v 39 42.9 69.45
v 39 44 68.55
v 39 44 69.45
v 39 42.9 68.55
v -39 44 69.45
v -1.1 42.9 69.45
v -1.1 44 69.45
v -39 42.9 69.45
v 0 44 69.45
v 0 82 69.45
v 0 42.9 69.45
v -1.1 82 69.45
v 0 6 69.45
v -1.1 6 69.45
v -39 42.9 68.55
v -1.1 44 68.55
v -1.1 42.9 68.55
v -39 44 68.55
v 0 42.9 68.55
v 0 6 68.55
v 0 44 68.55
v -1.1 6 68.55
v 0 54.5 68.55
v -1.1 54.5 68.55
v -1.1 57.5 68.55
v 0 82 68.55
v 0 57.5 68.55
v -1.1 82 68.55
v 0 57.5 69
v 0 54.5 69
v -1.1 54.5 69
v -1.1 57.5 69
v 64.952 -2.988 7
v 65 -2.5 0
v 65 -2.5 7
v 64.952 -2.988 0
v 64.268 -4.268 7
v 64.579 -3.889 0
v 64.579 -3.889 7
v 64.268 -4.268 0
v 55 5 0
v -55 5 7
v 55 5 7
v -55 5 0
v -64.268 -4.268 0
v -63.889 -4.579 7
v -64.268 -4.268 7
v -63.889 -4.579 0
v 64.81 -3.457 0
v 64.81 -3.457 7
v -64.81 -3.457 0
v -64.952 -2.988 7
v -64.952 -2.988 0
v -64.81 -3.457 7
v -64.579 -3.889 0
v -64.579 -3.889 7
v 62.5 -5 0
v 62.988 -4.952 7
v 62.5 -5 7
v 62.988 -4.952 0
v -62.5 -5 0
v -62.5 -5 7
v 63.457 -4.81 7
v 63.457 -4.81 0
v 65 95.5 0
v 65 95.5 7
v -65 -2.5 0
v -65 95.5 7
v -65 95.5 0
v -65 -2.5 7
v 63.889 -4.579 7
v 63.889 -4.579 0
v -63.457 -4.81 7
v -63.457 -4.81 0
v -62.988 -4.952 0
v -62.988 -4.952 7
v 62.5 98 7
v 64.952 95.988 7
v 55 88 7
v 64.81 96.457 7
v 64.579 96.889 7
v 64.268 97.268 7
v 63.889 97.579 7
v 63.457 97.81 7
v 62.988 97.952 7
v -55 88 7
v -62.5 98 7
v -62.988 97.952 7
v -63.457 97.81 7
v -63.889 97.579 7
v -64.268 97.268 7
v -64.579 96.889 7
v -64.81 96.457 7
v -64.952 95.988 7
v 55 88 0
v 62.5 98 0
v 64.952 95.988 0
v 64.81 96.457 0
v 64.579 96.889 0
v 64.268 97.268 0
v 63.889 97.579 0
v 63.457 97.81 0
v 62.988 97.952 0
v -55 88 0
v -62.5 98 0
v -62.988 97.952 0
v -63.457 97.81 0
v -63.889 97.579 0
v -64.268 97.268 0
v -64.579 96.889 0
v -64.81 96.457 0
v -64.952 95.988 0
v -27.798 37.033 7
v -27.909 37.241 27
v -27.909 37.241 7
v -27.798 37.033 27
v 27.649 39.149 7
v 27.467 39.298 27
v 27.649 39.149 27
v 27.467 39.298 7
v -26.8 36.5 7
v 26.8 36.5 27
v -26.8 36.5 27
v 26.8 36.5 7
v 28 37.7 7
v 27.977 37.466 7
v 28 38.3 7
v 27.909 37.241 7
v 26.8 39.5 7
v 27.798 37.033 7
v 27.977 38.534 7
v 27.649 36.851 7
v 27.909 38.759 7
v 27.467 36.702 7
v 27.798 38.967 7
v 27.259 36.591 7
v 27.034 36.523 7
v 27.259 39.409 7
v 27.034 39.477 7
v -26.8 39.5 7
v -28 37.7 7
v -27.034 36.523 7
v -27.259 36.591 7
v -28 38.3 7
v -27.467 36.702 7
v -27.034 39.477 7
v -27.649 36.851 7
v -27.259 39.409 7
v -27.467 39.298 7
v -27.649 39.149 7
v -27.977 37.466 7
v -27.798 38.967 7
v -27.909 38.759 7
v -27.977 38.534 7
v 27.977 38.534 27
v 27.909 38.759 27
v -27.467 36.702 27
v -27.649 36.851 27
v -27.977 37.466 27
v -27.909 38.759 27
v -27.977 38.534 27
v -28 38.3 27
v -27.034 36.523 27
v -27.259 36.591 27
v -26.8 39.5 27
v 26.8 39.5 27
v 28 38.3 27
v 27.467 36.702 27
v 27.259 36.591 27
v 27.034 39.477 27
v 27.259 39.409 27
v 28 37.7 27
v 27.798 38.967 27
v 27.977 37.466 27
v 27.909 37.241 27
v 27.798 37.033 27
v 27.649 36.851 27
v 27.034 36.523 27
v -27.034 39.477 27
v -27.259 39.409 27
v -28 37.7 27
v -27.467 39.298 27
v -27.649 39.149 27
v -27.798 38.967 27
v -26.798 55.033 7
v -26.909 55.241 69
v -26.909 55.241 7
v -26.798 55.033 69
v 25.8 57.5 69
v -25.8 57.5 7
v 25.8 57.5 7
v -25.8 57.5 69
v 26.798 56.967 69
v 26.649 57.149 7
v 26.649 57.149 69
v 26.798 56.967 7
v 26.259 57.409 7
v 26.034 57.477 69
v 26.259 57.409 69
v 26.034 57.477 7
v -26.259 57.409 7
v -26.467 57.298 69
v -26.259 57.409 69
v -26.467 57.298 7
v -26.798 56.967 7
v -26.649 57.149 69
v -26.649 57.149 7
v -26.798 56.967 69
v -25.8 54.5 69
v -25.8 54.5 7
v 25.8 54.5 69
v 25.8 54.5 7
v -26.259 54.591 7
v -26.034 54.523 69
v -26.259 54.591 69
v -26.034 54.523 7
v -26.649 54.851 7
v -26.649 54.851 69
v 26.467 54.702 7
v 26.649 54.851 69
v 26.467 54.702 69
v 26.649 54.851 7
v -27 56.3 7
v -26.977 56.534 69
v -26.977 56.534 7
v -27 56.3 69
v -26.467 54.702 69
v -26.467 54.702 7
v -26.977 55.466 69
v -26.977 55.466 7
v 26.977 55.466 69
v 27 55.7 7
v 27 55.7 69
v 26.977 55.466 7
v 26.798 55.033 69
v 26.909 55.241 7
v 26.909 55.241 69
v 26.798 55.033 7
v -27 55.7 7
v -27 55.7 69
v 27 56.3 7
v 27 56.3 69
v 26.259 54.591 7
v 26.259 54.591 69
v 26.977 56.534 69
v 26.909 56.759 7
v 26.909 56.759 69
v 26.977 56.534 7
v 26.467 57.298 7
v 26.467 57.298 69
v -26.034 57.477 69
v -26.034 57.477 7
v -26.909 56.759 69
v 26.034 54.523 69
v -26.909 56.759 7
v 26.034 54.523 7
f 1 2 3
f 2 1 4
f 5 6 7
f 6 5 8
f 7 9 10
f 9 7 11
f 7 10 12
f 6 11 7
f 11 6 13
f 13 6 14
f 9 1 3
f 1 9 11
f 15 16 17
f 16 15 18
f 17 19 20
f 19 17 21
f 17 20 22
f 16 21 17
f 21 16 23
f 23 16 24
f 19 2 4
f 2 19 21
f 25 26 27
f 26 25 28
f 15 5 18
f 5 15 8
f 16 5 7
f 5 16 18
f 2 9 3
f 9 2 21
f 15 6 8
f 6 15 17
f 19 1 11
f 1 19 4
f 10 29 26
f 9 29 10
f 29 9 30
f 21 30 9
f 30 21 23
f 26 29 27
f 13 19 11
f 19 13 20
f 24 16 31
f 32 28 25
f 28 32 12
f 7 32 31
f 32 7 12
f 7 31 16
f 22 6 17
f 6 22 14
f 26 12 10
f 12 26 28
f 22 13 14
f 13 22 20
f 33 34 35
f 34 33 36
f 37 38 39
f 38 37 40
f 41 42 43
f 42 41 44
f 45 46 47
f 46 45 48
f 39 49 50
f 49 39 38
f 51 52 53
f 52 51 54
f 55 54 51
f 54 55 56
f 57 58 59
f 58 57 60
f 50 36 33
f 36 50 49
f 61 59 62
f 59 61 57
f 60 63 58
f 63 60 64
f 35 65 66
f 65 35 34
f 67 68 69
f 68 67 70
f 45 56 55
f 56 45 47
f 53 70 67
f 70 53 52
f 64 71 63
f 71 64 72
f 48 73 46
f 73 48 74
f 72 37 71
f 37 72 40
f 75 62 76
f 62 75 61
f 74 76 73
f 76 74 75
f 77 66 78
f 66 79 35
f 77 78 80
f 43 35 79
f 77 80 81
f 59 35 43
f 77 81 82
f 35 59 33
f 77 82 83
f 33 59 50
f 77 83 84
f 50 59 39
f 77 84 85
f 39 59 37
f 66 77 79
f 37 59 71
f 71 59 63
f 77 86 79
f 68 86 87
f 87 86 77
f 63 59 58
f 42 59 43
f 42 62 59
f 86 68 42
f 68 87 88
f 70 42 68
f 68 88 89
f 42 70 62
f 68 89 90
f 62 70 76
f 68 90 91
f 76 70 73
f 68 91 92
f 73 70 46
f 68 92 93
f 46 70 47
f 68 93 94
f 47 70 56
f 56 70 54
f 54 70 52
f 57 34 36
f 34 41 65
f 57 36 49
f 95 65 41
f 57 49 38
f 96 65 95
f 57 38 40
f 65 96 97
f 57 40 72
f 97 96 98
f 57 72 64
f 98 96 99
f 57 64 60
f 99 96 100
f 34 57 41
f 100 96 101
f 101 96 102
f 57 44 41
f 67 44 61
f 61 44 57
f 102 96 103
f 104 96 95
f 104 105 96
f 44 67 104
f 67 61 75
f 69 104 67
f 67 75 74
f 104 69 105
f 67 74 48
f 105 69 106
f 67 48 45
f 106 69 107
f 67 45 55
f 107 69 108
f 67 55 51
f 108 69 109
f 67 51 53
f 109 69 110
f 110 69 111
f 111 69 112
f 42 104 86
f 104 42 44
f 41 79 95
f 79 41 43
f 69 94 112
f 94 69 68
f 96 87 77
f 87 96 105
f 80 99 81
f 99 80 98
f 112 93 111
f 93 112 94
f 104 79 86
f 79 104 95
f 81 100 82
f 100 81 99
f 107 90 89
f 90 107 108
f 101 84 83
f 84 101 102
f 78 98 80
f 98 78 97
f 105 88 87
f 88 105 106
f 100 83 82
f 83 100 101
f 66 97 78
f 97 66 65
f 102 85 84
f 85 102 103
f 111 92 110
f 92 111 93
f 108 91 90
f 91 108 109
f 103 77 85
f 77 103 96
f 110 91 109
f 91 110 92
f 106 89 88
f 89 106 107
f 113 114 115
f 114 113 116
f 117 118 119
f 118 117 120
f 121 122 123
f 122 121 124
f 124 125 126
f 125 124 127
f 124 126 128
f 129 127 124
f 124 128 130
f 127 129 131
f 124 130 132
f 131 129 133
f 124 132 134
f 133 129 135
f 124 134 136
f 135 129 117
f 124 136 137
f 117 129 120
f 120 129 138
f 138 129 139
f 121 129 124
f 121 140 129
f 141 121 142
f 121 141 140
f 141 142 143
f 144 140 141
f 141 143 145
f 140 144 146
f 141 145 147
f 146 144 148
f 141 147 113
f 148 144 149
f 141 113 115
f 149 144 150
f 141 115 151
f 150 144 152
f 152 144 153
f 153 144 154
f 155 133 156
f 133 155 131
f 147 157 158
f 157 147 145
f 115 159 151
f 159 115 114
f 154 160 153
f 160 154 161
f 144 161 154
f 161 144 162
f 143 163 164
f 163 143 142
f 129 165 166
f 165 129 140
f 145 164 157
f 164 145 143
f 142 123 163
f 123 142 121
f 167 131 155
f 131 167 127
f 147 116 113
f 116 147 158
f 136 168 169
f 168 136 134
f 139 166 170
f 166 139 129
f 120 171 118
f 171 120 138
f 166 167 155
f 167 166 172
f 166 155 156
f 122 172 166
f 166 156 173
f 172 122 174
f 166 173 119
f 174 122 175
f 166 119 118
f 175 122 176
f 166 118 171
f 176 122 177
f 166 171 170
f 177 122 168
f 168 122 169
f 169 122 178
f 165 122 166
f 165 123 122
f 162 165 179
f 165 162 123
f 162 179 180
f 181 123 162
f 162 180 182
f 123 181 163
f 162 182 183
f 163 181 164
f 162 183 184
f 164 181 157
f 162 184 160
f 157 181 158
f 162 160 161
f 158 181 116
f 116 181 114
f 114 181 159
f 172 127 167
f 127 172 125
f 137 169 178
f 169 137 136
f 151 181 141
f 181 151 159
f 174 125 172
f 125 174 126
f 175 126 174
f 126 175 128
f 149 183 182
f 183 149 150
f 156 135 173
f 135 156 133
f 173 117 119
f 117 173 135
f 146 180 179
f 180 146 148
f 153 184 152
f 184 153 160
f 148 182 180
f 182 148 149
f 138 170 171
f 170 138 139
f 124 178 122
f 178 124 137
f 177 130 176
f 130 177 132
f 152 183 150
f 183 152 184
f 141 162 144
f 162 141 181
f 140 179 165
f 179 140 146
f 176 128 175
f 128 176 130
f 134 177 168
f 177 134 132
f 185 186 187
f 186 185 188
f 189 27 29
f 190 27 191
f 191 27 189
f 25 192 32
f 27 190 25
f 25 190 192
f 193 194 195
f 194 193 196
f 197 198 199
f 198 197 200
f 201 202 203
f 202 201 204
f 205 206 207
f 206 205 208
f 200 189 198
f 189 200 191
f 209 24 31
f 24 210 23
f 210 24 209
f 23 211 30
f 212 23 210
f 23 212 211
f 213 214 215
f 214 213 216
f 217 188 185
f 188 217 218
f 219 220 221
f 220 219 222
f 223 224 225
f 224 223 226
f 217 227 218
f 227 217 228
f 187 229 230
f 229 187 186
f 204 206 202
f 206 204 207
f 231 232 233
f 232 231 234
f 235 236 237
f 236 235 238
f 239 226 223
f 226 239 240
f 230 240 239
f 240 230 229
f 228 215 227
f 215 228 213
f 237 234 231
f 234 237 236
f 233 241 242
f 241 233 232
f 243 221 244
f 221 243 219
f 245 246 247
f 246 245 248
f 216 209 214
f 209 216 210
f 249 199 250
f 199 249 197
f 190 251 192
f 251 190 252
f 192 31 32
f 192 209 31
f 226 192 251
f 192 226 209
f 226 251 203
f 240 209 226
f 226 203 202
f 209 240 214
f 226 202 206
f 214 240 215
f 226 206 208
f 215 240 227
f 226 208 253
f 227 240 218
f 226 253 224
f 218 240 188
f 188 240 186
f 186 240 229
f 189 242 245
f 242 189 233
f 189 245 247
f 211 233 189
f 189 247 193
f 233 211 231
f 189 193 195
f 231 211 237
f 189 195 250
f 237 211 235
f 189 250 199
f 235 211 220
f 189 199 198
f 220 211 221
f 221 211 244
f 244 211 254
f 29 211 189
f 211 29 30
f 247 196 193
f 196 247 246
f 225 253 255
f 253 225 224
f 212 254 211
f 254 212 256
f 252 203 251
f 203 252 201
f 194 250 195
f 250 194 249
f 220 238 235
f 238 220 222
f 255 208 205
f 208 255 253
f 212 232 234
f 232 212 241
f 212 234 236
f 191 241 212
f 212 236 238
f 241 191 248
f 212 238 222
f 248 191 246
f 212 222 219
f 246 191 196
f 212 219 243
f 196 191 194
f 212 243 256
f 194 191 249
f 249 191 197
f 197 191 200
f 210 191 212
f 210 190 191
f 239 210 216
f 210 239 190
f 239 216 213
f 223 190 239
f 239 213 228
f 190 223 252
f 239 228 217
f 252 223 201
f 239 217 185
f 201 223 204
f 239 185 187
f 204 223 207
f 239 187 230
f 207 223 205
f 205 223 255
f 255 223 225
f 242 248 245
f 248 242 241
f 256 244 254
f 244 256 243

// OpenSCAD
// file: ../s1_parameters.scad
// Shared S1 prototype parameters.
// Units are millimeters. Values are provisional fit/geometry defaults.

$fn = 32;

s1_project_scale = 87.1;

s1_length_over_coupler_faces = 320;
s1_sled_body_length = 300;
s1_structural_deck_length = 286;
s1_sled_width = 42;
s1_stabilization_envelope_width = 48;
s1_sled_height = 10;
s1_deck_height_above_g0 = 12;
s1_wall_thickness = 1.8;
s1_corner_radius = 4;
s1_printer_tolerance = 0.35;
s1_min_feature = 1.2;

s1_module_length = 180;
s1_module_width = 40;
s1_module_interface_height = 4;
s1_module_corner_radius = 4;

s1_mount_x = 70;
s1_mount_y = 15.5;
s1_mount_pin_diameter = 3.4;
s1_mount_clearance = 0.35;
s1_latch_slot_length = 12;
s1_latch_slot_width = 3.8;

s1_coupler_pivot_spacing = 278;
s1_coupler_drawbar_length = 20;
s1_coupler_pivot_diameter = 5.5;
s1_coupler_yaw_normal_deg = 15;
s1_coupler_yaw_hard_stop_deg = 18;
s1_coupler_vertical_play = 1.0;

s1_ballast_pocket_length = 24;
s1_ballast_pocket_width = 10;
s1_ballast_pocket_depth = 4;
s1_ballast_channel_length = 82;
s1_ballast_channel_width = 8;
s1_ballast_channel_depth = 4;

s1_split_key_length = 10;
s1_split_key_width = 5;
s1_split_key_height = 3;
s1_split_plane_x = 0;

s1_support_node_x = 176;
s1_support_node_y = 30;

s1_bed_x = 220;
s1_bed_y = 220;
s1_h2c_bed_x = 320;
s1_h2c_bed_y = 320;
s1_h2c_margin = 5;

s1_iso_container_width = 28;
s1_iso_container_height = 30;
s1_iso_high_cube_container_height = 33.3;
s1_iso_40ft_length = 140;
s1_iso_20ft_length = 70;
s1_container_fit_clearance_length = 1.5;
s1_container_fit_clearance_width = 1.2;
s1_container_retention_clearance = 4;
s1_container_retention_rail_height = 2.4;
s1_container_retention_rail_width = 2.0;
s1_container_20ft_gap = 4;

s1_commuter_pod_height = 34;
s1_overnight_pod_height = 40;
s1_battery_pod_height = 32;
s1_container_adapter_height = 30;
s1_open_bin_height = 32;
s1_ballast_module_height = 46;
s1_split_key_y = 12;
s1_ballast_pocket_x = 52;
s1_ballast_pocket_y = 10;

module rounded_box(size, radius = 3) {
  r = min(radius, min(size[0], size[1]) / 2 - 0.01);
  hull() {
    for (x = [-size[0] / 2 + r, size[0] / 2 - r])
      for (y = [-size[1] / 2 + r, size[1] / 2 - r])
        translate([x, y, 0])
          cylinder(h = size[2], r = r);
  }
}

module datum_cross(size = 18, height = 0.9, width = 1.4) {
  translate([0, -width / 2, 0]) cube([size, width, height], center = true);
  translate([-width / 2, 0, 0]) cube([width, size, height], center = true);
}

module centerline_marks(length, width, z, height = 0.8) {
  translate([0, -0.55, z]) cube([length, 1.1, height], center = true);
  translate([-0.55, 0, z]) cube([1.1, width, height], center = true);
}

module module_attachment_positions() {
  for (x = [-s1_mount_x, s1_mount_x])
    for (y = [-s1_mount_y, s1_mount_y])
      translate([x, y, 0]) children();
}

module support_node_positions() {
  for (x = [-s1_support_node_x / 2, s1_support_node_x / 2])
    for (y = [-s1_support_node_y / 2, s1_support_node_y / 2])
      translate([x, y, 0]) children();
}

module ballast_pocket_positions() {
  for (x = [-s1_ballast_pocket_x, s1_ballast_pocket_x])
    for (y = [-s1_ballast_pocket_y, s1_ballast_pocket_y])
      translate([x, y, 0]) children();
}

module mount_pin_holes(height = 30, clearance = s1_mount_clearance) {
  module_attachment_positions()
    cylinder(h = height, r = s1_mount_pin_diameter / 2 + clearance, center = true);
}

module latch_slots(height = 20, clearance = s1_mount_clearance) {
  module_attachment_positions()
    translate([0, 0, 0])
      rounded_box([s1_latch_slot_length + clearance, s1_latch_slot_width + clearance, height], 1.5);
}

module module_interface_cutouts(height = 20, clearance = s1_mount_clearance) {
  mount_pin_holes(height = height, clearance = clearance);
  latch_slots(height = height, clearance = clearance);
}

module module_interface_base(height = s1_module_interface_height, radius = 6, cutout_height = 14) {
  difference() {
    rounded_box([s1_module_length, s1_module_width, height], radius);
    module_interface_cutouts(height = cutout_height);
  }
}

module module_interface_underside(height = 4) {
  module_attachment_positions()
    cylinder(h = height, r = s1_mount_pin_diameter / 2, center = false);
}

module split_front_clip(length, width = 180, height = 180) {
  translate([length / 4 + 0.02, 0, height / 2 - 20])
    cube([length / 2 + 0.04, width, height], center = true);
}

module split_rear_clip(length, width = 180, height = 180) {
  translate([-length / 4 - 0.02, 0, height / 2 - 20])
    cube([length / 2 + 0.04, width, height], center = true);
}

module split_alignment_male(z = 2, clearance = 0) {
  for (y = [-s1_split_key_y, s1_split_key_y])
    translate([
      -s1_split_key_length + clearance,
      y - s1_split_key_width / 2 + clearance,
      z
    ])
      cube([
        s1_split_key_length + 10,
        s1_split_key_width - 2 * clearance,
        s1_split_key_height - 2 * clearance
      ]);
}

module split_alignment_receiver(z = 2) {
  split_alignment_male(z = z - s1_printer_tolerance / 2, clearance = -s1_printer_tolerance);
}

module split_alignment_sockets(side = "front", z = 0.4) {
  socket_depth = min(s1_split_key_height, 3.0 + z);
  socket_length = s1_split_key_length + 10;
  socket_width = s1_split_key_width + 2 * s1_printer_tolerance;
  x_center = side == "rear" ? -socket_length / 2 + 0.4 : socket_length / 2 - 0.4;
  for (y = [-s1_split_key_y, s1_split_key_y])
    translate([x_center, y, -0.05])
      rounded_box([socket_length, socket_width, socket_depth + 0.05], 1.1);
}

module loose_alignment_keys() {
  for (y = [-8, 8])
    translate([0, y, 0])
      rounded_box([44, s1_split_key_width - 0.4, s1_split_key_height - 0.4], 1.2);
}

module module_split_keys_front(z = 2) {
  split_alignment_male(z = z);
}

module module_split_keys_rear(z = 2) {
  split_alignment_receiver(z = z);
}

module aerodynamic_pod_shell(length, width, height, nose = 24, roof_inset = 10, radius = 7) {
  hull() {
    rounded_box([length, width, 3], radius);
    translate([0, 0, height - 3])
      rounded_box([length - 2 * nose, width - roof_inset, 3], max(2, radius - 2));
  }
}

module side_panel_breaks(length, width, z, height = 1.0) {
  for (x = [-length / 4, 0, length / 4])
    translate([x, width / 2 - 8, z])
      cube([1.2, 1.4, height], center = true);
  for (x = [-length / 4, 0, length / 4])
    translate([x, -width / 2 + 8, z])
      cube([1.2, 1.4, height], center = true);
}

module cg_marker(z, size = 16) {
  translate([0, 0, z]) datum_cross(size = size, height = 0.8, width = 1.2);
}

module ballast_blocks(z = 5) {
  ballast_pocket_positions()
    translate([0, 0, z])
      rounded_box([s1_ballast_pocket_length - 5, s1_ballast_pocket_width - 4, 6], 2);
}

module module_half(part, length, width, height) {
  if (part == "front")
    split_front_clip(length, width, height) children();
  else if (part == "rear")
    split_rear_clip(length, width, height) children();
  else
    children();
}
// main file
include <../s1_parameters.scad>

module clearance_gauge() {
  platform_gap = 10;
  vehicle_clearance = s1_stabilization_envelope_width + 8;
  station_clearance = s1_module_width + 14;
  total_height = s1_deck_height_above_g0 + s1_overnight_pod_height + s1_module_interface_height + 6;
  union() {
    rounded_box([130, 10, 7], 2.5);
    translate([-60, 44, 0])
      rounded_box([10, 98, 7], 2.5);
    translate([60, 44, 0])
      rounded_box([10, 98, 7], 2.5);
    translate([0, 93, 0])
      rounded_box([130, 10, 7], 2.5);
    translate([0, platform_gap + vehicle_clearance / 2, 7])
      rounded_box([vehicle_clearance, 3, s1_deck_height_above_g0 + 8], 1.2);
    translate([0, 56, 7])
      rounded_box([station_clearance, 3, total_height], 1.2);
    translate([0, 44, total_height + 7])
      centerline_marks(station_clearance + 24, 76, 0, height = 0.9);
  }
}

clearance_gauge();
